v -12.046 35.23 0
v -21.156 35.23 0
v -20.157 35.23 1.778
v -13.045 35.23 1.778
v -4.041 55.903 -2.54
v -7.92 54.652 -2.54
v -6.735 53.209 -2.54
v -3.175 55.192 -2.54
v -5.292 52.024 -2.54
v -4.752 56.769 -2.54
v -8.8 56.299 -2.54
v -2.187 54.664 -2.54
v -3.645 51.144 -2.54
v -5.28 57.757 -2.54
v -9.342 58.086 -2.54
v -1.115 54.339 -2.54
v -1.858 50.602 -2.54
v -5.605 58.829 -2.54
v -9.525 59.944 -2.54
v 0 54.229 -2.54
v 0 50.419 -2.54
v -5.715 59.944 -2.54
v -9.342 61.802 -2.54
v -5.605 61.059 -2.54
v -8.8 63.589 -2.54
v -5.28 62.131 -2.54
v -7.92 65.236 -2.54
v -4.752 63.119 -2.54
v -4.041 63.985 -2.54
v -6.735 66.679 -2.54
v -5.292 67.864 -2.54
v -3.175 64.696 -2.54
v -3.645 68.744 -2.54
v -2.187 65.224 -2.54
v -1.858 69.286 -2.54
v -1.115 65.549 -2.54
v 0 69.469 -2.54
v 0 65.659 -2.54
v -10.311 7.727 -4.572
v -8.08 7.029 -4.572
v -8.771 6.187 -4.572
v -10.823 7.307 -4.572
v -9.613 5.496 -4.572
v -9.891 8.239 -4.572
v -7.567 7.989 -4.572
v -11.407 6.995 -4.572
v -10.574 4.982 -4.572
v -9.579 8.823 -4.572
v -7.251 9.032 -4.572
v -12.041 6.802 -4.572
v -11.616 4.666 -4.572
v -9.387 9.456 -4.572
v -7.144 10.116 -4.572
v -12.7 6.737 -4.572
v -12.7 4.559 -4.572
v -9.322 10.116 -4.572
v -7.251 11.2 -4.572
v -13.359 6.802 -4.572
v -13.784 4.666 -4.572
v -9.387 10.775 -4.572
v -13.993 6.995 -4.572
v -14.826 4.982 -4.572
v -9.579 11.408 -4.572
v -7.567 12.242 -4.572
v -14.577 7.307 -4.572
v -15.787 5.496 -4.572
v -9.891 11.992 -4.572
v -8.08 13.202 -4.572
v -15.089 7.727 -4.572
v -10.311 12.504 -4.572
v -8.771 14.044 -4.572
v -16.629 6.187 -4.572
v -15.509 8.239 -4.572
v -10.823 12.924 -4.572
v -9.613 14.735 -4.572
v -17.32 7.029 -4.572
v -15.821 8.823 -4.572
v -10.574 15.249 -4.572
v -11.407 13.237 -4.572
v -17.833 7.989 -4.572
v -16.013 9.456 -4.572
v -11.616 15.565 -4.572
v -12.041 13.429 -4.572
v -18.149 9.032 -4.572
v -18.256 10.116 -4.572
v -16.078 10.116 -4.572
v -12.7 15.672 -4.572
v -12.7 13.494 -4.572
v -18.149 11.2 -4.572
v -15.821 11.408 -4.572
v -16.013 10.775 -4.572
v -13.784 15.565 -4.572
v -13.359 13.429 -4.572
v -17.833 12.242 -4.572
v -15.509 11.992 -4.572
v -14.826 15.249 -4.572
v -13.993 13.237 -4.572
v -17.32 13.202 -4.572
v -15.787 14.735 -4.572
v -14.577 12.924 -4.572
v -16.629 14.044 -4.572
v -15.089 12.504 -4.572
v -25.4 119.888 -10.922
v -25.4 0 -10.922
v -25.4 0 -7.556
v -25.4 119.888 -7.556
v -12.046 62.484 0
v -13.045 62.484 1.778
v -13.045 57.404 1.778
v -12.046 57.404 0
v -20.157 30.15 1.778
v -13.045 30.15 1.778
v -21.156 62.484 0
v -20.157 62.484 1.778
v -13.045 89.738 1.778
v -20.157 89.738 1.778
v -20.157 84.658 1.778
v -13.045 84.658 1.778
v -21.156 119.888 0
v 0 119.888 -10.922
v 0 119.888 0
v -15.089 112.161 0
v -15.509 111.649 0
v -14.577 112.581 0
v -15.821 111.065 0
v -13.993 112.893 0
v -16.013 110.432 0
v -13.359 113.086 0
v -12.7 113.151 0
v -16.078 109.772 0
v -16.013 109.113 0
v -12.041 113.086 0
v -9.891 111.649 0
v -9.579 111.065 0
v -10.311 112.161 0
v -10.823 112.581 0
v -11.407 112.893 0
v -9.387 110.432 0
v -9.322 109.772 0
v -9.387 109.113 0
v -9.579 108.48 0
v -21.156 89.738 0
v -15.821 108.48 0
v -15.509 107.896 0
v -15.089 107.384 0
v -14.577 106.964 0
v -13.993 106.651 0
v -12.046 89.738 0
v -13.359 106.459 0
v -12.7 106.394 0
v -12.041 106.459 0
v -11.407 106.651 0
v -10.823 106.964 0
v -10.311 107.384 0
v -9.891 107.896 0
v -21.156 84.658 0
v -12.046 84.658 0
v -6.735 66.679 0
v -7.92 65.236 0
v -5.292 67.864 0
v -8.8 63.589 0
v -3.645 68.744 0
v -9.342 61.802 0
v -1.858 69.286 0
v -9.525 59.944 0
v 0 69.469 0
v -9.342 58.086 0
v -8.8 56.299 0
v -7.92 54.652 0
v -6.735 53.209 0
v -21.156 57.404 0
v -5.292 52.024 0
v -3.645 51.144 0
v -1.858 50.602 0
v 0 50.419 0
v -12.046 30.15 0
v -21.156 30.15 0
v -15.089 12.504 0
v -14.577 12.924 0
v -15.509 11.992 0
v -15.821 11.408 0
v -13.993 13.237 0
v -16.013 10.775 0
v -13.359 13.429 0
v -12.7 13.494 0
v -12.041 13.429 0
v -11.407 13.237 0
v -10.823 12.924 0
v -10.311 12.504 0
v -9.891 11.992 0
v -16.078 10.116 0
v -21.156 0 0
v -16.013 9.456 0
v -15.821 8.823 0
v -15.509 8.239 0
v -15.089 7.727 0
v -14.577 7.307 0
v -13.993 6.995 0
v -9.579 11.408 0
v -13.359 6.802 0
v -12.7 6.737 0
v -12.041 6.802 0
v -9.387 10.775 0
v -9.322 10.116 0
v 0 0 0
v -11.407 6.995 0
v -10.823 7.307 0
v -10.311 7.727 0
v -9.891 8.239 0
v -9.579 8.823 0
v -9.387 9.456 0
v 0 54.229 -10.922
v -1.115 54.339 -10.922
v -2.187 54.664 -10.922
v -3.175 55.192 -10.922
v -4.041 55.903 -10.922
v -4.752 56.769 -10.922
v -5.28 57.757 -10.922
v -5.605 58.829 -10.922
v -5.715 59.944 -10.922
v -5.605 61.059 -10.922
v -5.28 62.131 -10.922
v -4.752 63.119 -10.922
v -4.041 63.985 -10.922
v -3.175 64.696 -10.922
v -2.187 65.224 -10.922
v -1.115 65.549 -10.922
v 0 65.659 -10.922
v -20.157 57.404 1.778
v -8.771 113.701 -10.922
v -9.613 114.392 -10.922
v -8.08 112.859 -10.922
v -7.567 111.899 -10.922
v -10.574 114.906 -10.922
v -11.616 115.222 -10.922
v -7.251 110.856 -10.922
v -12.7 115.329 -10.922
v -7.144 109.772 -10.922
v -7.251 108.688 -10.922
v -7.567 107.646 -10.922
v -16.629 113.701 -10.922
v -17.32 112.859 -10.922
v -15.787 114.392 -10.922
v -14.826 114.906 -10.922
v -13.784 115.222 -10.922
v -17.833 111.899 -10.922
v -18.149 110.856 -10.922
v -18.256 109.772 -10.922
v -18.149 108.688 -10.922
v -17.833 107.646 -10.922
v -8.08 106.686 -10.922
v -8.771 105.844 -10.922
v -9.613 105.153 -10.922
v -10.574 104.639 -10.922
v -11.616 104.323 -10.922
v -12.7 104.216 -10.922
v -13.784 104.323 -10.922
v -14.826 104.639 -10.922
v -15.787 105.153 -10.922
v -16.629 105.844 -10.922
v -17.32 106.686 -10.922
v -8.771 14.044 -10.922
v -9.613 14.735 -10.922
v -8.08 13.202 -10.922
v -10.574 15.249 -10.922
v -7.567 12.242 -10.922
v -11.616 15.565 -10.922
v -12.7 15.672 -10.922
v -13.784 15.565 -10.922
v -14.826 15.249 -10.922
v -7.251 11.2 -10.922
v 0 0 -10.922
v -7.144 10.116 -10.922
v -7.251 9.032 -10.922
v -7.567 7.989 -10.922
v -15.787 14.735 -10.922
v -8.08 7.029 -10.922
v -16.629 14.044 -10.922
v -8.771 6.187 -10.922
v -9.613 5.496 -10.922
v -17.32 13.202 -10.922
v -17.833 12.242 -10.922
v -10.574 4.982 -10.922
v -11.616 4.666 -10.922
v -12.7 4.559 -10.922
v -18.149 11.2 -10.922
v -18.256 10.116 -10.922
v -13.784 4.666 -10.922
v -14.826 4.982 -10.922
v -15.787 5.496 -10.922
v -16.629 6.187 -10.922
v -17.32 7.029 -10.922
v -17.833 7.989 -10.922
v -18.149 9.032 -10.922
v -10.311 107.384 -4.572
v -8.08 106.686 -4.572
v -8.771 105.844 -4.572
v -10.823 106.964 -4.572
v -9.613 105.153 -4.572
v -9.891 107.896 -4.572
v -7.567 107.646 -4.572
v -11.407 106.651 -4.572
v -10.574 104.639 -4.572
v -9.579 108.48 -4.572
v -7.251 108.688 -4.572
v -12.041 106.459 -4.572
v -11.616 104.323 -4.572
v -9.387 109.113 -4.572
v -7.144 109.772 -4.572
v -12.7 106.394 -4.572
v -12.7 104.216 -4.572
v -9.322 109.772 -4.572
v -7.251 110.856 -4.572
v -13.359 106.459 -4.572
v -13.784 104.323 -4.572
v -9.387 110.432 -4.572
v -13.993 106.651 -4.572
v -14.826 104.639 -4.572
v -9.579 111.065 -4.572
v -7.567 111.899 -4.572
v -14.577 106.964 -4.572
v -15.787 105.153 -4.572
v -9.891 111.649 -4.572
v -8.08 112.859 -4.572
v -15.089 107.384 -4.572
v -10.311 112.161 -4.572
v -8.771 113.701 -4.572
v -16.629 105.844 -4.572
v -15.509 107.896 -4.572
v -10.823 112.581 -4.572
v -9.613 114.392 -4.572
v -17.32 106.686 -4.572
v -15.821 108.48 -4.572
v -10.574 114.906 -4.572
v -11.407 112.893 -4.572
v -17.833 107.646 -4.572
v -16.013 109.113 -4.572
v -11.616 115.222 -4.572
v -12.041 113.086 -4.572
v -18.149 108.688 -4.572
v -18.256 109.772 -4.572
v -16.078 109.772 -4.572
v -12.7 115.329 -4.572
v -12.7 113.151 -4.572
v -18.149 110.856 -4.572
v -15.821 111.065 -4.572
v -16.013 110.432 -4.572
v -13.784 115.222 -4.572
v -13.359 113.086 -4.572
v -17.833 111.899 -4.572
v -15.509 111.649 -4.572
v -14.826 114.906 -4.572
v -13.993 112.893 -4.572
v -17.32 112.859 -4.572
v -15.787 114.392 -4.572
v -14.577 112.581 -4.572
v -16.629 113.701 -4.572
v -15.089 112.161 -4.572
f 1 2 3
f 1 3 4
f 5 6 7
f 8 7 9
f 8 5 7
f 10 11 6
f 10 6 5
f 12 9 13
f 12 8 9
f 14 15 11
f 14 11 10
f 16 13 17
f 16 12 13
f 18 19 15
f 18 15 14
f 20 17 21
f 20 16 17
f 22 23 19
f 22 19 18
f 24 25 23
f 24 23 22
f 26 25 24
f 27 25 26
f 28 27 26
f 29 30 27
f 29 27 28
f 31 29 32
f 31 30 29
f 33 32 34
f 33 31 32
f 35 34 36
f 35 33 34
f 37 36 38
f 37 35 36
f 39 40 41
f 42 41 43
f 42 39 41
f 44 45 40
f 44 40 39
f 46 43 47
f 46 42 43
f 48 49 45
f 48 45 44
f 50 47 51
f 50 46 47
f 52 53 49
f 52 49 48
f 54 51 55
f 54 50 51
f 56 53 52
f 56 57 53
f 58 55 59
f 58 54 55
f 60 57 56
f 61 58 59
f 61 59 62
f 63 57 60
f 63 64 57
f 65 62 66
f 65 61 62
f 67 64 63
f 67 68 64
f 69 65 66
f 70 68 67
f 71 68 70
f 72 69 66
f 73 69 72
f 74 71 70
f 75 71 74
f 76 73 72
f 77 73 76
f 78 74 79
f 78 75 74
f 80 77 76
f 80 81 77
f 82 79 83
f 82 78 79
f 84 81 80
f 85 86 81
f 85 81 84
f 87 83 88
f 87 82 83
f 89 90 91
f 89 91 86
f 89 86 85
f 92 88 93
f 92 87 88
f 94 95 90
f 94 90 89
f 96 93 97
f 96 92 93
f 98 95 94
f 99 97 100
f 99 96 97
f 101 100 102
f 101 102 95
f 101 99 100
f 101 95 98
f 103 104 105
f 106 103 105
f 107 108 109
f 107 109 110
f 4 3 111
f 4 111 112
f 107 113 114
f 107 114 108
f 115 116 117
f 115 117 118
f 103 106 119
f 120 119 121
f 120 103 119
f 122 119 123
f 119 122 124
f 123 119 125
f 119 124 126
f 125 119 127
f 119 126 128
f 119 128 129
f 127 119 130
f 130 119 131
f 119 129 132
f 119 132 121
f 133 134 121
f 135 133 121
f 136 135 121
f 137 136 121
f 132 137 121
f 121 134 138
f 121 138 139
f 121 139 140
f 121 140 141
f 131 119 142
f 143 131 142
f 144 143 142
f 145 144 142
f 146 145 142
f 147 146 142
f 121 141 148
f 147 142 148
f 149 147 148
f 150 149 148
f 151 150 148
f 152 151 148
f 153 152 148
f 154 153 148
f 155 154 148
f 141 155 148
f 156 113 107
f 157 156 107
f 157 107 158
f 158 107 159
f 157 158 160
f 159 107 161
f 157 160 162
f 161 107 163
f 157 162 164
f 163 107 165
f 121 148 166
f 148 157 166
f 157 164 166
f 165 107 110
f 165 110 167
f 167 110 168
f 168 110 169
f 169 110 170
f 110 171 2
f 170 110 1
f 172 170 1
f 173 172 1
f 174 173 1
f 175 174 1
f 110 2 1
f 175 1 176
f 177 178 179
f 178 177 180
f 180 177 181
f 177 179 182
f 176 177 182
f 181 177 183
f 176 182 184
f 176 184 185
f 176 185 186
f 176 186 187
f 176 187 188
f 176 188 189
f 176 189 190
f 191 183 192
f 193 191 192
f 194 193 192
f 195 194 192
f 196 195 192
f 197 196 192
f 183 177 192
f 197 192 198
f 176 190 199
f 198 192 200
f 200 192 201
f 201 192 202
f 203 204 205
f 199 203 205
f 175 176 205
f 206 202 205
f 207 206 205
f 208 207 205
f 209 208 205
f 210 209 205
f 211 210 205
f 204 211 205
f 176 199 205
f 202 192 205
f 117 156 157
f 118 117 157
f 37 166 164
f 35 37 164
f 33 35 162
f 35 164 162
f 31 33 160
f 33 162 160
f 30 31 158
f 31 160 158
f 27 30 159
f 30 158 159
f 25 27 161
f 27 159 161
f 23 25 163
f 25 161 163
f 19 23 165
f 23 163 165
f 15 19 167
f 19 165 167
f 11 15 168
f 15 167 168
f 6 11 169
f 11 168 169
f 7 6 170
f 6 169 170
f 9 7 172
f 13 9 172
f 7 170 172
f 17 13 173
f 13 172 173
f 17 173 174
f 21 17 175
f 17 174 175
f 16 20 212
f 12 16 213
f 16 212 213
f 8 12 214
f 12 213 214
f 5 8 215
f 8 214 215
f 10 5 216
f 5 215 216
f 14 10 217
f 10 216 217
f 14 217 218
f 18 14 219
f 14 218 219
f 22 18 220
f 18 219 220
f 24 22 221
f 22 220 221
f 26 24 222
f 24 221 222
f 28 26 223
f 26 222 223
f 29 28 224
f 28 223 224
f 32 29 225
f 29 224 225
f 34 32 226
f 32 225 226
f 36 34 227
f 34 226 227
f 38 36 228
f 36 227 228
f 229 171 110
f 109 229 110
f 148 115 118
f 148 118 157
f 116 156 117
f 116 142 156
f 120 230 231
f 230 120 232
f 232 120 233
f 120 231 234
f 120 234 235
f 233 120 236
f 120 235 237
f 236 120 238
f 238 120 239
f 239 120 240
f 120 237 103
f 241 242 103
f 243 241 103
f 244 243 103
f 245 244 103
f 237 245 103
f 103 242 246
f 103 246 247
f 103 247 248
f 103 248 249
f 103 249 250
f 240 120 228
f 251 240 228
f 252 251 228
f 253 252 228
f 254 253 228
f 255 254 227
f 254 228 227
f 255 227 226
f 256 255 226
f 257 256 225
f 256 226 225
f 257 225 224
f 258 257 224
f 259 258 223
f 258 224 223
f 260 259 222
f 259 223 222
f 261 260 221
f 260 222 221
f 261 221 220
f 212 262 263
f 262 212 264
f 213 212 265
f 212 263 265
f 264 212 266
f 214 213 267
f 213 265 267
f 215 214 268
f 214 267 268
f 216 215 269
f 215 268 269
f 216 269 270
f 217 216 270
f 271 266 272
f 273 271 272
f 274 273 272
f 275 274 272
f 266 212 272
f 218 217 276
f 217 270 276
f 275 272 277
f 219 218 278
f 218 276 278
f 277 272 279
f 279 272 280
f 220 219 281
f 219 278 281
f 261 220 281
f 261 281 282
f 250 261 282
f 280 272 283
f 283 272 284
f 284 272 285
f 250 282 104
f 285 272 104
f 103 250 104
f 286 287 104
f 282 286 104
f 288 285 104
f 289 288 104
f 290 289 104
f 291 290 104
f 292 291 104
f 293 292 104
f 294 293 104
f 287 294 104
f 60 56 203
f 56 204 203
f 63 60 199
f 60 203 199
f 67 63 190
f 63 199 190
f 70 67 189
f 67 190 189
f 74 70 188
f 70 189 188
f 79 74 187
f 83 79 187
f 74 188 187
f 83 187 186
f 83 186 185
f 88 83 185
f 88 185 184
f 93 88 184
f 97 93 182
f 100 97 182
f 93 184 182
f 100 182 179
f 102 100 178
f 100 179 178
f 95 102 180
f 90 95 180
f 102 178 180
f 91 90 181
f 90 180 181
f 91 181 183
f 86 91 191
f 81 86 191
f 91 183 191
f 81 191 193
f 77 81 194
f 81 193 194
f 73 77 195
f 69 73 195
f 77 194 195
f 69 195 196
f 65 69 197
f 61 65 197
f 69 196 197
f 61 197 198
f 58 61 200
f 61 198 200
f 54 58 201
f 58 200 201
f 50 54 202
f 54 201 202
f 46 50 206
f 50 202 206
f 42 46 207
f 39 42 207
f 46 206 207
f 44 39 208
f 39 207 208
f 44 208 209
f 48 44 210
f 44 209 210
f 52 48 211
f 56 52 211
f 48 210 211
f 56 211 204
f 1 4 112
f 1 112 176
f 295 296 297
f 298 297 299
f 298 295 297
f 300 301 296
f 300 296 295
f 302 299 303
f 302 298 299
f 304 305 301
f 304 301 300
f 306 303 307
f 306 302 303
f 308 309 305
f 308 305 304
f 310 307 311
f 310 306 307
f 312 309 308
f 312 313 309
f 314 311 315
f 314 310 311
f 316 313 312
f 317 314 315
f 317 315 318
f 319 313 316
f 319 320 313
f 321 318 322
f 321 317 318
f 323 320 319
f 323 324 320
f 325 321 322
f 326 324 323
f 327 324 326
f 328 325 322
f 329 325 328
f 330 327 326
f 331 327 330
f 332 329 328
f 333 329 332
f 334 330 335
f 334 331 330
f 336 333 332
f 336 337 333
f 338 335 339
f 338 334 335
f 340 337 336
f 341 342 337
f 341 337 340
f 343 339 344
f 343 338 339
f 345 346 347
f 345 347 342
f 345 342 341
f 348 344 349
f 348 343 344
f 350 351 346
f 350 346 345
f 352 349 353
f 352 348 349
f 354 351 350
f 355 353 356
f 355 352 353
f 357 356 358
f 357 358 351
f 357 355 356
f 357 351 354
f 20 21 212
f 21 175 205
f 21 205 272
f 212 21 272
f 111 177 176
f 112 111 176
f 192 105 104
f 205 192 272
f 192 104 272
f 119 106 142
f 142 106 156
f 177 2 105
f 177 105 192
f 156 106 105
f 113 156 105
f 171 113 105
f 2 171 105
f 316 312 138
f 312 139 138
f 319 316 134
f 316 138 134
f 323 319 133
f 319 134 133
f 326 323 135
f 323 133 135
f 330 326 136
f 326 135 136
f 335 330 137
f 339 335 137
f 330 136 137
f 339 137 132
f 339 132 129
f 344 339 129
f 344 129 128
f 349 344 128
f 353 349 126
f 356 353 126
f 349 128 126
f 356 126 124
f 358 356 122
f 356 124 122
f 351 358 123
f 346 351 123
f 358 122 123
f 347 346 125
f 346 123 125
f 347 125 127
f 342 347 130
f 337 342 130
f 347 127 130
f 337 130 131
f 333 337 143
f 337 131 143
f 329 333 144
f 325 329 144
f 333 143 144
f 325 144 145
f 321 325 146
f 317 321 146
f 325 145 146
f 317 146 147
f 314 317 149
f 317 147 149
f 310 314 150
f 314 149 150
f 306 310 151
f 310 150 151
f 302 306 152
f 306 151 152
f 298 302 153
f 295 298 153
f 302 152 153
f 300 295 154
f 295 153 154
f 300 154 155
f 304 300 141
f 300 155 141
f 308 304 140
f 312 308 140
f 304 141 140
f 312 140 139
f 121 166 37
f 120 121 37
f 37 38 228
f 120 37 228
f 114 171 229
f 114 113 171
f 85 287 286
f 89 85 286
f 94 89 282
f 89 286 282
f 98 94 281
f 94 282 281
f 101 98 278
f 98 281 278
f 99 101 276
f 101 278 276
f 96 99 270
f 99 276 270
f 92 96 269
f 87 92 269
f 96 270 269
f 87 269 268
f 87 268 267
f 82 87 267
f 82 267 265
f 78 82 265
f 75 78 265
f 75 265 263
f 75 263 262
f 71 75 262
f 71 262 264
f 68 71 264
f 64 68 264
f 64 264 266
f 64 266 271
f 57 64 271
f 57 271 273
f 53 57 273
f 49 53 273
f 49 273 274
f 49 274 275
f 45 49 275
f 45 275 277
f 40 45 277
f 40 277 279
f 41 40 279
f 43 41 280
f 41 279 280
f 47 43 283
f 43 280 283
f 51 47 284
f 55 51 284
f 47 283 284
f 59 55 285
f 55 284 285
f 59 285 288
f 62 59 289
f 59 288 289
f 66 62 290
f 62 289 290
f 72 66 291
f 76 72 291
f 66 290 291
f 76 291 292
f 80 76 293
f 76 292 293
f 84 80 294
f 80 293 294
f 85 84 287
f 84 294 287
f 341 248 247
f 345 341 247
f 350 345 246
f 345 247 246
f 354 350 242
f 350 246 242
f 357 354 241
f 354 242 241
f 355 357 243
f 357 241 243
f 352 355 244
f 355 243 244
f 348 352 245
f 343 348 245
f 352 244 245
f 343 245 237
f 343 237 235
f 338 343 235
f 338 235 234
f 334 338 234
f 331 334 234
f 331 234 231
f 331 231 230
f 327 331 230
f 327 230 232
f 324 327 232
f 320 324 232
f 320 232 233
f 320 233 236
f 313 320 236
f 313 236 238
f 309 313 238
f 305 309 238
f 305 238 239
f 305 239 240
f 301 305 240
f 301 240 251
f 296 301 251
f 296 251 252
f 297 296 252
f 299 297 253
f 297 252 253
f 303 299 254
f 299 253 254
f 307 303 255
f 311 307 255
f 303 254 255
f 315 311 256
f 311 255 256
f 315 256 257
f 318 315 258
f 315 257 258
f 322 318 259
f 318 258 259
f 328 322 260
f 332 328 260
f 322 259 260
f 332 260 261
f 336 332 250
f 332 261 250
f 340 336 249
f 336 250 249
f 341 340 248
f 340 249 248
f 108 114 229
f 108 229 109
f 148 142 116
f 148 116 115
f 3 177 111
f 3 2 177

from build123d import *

# Parameters (mm, degrees)
BOSS_EXTRUDE1_DEPTH                              = 119.888
CBORE_FOR_1_4_SOCKET_HEAD_CAP_SCREW1_D           = 6.7564
CBORE_FOR_1_4_SOCKET_HEAD_CAP_SCREW1_CBORE_D     = 11.1125
CBORE_FOR_1_4_SOCKET_HEAD_CAP_SCREW1_CBORE_DEPTH = 6.35
SKETCH4_R                                        = 5.715
CUT_EXTRUDE1_DEPTH                               = 124.034883785
BOSS_EXTRUDE2_DEPTH                              = 2.54
LPATTERN1_COUNT                                  = 2
LPATTERN1_PITCH                                  = 27.2542
LPATTERN1_COL_COUNT                              = 2
LPATTERN1_COL_PITCH                              = 27.2542
SKETCH6_R                                        = 9.525
CUT_EXTRUDE2_DEPTH                               = 2.54


with BuildPart() as part:
    # Sketch1 → Boss-Extrude1 (new body)
    with BuildSketch(Plane(origin=(0, 0, 0), x_dir=(1, 0, 0), z_dir=(0, 1, 0))):
        Polygon((0, 0), (0, 10.922), (-25.4, 10.922), (-25.4, 7.5565), (-21.155673935, 0), align=None)
    extrude(amount=BOSS_EXTRUDE1_DEPTH)

    # CBORE for 1/4 Socket Head Cap Screw1 (through all)
    with Locations(Plane(origin=(0, 0, -10.922), x_dir=(-1, 0, 0), z_dir=(0, 0, -1))):
        with Locations((12.7, 109.77245), (12.7, 10.11555)):
            CounterBoreHole(CBORE_FOR_1_4_SOCKET_HEAD_CAP_SCREW1_D / 2, CBORE_FOR_1_4_SOCKET_HEAD_CAP_SCREW1_CBORE_D / 2, CBORE_FOR_1_4_SOCKET_HEAD_CAP_SCREW1_CBORE_DEPTH)

    # Sketch4 → Cut-Extrude1 (cut, through all)
    with BuildSketch(Plane(origin=(0, 0, -10.922), x_dir=(-1, 0, 0), z_dir=(0, 0, -1))):
        with Locations((0, 59.944)):
            Circle(SKETCH4_R)
    extrude(amount=-CUT_EXTRUDE1_DEPTH, mode=Mode.SUBTRACT)

    # Sketch5 → Boss-Extrude2 (add, symmetric)
    with BuildSketch(Plane(origin=(0, 59.944, 0), x_dir=(1, 0, 0), z_dir=(0, 1, 0))):
        Polygon((-21.155673935, 0), (-20.157008978, -1.778), (-13.045008978, -1.778), (-12.046344022, 0), align=None)
    boss_extrude2 = extrude(amount=BOSS_EXTRUDE2_DEPTH, both=True)

    # LPattern1: Boss-Extrude2 ×2
    with Locations(*[(0, -i * LPATTERN1_PITCH, 0) for i in range(1, LPATTERN1_COUNT)]):
        add(boss_extrude2)

    # LPattern1 col: Boss-Extrude2 ×2
    with Locations(*[(0, i * LPATTERN1_COL_PITCH, 0) for i in range(1, LPATTERN1_COL_COUNT)]):
        add(boss_extrude2)

    # Sketch6 → Cut-Extrude2 (cut)
    with BuildSketch(Plane.XY):
        with Locations((0, 59.944)):
            Circle(SKETCH6_R)
    extrude(amount=-CUT_EXTRUDE2_DEPTH, mode=Mode.SUBTRACT)


solid = part.part
